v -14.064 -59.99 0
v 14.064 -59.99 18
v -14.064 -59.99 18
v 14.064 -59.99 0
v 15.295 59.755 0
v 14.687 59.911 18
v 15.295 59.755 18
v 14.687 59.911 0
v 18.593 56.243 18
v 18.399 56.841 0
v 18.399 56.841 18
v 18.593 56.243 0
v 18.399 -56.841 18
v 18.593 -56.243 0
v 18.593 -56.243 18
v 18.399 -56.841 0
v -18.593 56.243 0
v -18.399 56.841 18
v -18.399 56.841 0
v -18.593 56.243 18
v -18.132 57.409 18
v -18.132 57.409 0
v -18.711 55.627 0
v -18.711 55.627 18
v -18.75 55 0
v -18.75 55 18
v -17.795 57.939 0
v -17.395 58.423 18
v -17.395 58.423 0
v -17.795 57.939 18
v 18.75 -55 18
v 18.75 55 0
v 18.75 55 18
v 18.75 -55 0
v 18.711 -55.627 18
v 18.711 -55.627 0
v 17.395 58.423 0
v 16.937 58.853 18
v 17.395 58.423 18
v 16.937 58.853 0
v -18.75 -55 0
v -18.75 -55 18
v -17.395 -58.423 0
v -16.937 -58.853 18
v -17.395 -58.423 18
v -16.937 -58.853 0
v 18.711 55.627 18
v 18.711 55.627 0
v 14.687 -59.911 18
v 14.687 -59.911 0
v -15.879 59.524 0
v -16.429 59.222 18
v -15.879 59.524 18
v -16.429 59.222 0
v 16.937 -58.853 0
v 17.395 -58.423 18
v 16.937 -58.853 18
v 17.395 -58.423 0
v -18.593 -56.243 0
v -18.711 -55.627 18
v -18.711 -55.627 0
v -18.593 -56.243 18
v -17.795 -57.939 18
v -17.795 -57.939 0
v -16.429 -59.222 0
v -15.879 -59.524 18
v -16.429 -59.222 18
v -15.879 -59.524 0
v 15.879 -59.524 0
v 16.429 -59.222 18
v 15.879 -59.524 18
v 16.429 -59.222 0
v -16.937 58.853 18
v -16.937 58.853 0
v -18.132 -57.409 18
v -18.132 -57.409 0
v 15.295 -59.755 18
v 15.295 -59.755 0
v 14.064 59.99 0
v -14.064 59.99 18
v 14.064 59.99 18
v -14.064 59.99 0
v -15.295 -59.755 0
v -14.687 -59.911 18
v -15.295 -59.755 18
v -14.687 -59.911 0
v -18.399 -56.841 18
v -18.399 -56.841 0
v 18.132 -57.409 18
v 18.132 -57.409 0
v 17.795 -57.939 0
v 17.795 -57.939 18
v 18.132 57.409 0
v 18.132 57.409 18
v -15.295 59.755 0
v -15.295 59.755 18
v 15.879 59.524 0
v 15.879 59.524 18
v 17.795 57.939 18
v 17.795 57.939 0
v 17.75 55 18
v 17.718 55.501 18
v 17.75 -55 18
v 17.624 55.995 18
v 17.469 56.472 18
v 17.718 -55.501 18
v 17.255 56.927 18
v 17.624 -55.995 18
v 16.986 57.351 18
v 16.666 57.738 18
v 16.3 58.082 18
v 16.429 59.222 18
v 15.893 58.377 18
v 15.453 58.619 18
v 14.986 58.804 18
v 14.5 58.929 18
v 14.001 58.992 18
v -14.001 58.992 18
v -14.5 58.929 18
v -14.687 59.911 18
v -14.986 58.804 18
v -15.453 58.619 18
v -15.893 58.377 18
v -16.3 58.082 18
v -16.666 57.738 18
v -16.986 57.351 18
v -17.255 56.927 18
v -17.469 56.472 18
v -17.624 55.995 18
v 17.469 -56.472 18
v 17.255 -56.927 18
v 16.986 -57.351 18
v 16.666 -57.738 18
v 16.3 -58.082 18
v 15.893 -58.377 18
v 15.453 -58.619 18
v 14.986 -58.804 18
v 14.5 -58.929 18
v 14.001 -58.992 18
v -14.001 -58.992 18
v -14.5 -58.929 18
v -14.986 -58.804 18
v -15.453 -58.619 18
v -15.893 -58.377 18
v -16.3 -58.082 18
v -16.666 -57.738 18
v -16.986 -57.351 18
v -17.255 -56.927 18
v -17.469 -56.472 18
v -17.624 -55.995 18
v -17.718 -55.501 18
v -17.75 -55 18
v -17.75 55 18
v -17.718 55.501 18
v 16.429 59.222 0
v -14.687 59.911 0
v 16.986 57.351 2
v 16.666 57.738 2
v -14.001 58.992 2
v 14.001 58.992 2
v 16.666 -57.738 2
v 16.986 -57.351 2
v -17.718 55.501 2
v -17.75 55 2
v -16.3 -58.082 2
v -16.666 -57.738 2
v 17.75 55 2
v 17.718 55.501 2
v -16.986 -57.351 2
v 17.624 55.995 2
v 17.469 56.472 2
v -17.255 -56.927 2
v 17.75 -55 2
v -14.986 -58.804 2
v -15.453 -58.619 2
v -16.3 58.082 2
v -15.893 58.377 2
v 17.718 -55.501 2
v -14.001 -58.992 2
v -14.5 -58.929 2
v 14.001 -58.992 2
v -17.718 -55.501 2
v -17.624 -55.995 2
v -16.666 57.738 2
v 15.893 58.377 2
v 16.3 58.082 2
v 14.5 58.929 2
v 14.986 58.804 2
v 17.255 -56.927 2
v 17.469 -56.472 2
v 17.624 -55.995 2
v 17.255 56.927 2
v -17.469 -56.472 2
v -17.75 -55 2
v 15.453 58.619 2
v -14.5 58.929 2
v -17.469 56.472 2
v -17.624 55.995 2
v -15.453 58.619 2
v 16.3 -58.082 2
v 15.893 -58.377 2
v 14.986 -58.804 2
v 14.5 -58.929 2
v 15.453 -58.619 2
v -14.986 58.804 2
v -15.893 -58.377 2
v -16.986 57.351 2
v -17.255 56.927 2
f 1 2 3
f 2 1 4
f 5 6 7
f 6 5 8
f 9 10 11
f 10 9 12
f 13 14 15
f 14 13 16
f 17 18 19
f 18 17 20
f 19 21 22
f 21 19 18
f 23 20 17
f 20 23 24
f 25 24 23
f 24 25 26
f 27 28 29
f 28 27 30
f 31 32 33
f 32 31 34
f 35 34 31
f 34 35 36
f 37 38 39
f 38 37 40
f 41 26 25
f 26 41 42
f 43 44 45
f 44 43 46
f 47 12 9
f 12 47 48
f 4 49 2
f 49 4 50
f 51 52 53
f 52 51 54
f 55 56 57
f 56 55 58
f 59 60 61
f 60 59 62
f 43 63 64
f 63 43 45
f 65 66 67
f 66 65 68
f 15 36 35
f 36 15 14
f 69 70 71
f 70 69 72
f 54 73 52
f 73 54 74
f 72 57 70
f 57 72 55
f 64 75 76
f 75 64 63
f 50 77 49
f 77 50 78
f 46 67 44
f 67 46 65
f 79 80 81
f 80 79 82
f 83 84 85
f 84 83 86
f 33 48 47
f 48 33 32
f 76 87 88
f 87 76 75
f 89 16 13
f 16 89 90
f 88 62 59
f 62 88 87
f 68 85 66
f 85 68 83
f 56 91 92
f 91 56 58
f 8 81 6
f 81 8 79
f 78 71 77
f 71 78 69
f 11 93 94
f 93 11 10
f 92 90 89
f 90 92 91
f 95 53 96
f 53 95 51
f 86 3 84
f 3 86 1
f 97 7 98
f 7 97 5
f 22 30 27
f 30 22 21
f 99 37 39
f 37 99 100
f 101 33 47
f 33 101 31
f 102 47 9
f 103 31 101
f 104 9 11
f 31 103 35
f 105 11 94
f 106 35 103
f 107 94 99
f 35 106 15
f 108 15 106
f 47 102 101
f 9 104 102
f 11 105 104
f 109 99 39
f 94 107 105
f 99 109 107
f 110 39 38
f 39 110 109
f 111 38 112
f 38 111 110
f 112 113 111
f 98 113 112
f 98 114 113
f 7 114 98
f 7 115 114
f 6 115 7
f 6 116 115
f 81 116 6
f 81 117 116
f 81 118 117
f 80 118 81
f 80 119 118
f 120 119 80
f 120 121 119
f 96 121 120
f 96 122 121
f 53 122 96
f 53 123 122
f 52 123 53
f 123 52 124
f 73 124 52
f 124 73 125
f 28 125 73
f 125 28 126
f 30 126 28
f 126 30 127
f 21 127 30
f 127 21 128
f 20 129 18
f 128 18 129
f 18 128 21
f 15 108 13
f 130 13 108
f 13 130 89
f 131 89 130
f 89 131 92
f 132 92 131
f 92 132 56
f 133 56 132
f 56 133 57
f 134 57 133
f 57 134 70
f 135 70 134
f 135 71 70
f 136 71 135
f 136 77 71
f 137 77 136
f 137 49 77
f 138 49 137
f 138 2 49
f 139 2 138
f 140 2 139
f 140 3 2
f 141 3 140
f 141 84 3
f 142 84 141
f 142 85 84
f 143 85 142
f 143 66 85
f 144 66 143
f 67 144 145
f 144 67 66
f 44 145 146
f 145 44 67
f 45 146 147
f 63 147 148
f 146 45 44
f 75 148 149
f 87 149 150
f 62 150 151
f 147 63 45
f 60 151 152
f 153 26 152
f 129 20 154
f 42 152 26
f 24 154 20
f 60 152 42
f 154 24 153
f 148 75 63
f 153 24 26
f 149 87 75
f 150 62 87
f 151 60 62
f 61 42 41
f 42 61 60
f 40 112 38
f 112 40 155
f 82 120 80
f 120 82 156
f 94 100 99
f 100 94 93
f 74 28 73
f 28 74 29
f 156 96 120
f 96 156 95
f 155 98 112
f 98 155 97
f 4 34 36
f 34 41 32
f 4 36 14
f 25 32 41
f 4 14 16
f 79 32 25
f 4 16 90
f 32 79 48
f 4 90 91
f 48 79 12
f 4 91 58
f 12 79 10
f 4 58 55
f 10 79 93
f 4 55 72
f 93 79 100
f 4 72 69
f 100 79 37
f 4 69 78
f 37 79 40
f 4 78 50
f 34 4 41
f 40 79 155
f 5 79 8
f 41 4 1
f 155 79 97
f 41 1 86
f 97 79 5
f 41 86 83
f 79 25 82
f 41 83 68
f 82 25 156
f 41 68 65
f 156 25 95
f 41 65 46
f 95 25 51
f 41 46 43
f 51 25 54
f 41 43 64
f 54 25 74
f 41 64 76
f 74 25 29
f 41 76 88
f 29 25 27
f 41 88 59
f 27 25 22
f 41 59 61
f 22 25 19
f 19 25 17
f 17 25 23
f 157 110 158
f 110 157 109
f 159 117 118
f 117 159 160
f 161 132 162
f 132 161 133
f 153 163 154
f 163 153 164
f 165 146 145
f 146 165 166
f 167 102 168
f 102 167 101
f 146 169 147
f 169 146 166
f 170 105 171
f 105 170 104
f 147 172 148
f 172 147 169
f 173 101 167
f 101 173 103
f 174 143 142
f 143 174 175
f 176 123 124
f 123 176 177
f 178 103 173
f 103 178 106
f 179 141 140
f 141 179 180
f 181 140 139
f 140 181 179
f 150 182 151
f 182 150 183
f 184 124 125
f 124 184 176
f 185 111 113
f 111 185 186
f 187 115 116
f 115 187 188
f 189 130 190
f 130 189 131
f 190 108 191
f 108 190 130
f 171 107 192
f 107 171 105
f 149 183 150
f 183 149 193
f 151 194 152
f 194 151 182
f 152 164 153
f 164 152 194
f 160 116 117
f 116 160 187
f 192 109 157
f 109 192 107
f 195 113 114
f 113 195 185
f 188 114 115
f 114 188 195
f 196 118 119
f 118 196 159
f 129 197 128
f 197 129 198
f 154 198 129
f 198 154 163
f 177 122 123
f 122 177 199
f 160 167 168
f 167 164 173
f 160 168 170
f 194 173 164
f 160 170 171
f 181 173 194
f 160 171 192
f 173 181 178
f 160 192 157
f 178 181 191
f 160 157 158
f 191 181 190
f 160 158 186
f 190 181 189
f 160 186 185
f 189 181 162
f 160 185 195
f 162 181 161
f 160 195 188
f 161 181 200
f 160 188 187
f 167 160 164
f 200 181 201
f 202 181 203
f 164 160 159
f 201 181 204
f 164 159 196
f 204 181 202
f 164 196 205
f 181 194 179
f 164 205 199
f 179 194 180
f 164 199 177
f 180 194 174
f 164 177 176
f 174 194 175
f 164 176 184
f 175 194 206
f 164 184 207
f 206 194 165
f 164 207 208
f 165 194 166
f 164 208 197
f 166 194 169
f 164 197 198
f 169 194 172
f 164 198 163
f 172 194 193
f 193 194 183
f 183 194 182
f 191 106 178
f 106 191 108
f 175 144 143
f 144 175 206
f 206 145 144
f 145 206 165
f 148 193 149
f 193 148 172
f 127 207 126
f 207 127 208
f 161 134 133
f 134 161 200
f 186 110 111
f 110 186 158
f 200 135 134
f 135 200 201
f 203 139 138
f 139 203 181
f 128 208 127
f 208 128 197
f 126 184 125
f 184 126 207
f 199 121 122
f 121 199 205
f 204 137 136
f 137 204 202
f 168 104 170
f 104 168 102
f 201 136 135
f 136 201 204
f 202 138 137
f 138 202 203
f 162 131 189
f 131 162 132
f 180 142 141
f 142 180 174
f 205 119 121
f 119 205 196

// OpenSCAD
$fn = 50;


difference() {
	union() {
		hull() {
			translate(v = [-13.7500000000, 55.0000000000, 0]) {
				cylinder(h = 18, r = 5);
			}
			translate(v = [13.7500000000, 55.0000000000, 0]) {
				cylinder(h = 18, r = 5);
			}
			translate(v = [-13.7500000000, -55.0000000000, 0]) {
				cylinder(h = 18, r = 5);
			}
			translate(v = [13.7500000000, -55.0000000000, 0]) {
				cylinder(h = 18, r = 5);
			}
		}
	}
	union() {
		translate(v = [0, 0, 2]) {
			hull() {
				translate(v = [-13.7500000000, 55.0000000000, 0]) {
					cylinder(h = 16, r = 4);
				}
				translate(v = [13.7500000000, 55.0000000000, 0]) {
					cylinder(h = 16, r = 4);
				}
				translate(v = [-13.7500000000, -55.0000000000, 0]) {
					cylinder(h = 16, r = 4);
				}
				translate(v = [13.7500000000, -55.0000000000, 0]) {
					cylinder(h = 16, r = 4);
				}
			}
		}
	}
}
